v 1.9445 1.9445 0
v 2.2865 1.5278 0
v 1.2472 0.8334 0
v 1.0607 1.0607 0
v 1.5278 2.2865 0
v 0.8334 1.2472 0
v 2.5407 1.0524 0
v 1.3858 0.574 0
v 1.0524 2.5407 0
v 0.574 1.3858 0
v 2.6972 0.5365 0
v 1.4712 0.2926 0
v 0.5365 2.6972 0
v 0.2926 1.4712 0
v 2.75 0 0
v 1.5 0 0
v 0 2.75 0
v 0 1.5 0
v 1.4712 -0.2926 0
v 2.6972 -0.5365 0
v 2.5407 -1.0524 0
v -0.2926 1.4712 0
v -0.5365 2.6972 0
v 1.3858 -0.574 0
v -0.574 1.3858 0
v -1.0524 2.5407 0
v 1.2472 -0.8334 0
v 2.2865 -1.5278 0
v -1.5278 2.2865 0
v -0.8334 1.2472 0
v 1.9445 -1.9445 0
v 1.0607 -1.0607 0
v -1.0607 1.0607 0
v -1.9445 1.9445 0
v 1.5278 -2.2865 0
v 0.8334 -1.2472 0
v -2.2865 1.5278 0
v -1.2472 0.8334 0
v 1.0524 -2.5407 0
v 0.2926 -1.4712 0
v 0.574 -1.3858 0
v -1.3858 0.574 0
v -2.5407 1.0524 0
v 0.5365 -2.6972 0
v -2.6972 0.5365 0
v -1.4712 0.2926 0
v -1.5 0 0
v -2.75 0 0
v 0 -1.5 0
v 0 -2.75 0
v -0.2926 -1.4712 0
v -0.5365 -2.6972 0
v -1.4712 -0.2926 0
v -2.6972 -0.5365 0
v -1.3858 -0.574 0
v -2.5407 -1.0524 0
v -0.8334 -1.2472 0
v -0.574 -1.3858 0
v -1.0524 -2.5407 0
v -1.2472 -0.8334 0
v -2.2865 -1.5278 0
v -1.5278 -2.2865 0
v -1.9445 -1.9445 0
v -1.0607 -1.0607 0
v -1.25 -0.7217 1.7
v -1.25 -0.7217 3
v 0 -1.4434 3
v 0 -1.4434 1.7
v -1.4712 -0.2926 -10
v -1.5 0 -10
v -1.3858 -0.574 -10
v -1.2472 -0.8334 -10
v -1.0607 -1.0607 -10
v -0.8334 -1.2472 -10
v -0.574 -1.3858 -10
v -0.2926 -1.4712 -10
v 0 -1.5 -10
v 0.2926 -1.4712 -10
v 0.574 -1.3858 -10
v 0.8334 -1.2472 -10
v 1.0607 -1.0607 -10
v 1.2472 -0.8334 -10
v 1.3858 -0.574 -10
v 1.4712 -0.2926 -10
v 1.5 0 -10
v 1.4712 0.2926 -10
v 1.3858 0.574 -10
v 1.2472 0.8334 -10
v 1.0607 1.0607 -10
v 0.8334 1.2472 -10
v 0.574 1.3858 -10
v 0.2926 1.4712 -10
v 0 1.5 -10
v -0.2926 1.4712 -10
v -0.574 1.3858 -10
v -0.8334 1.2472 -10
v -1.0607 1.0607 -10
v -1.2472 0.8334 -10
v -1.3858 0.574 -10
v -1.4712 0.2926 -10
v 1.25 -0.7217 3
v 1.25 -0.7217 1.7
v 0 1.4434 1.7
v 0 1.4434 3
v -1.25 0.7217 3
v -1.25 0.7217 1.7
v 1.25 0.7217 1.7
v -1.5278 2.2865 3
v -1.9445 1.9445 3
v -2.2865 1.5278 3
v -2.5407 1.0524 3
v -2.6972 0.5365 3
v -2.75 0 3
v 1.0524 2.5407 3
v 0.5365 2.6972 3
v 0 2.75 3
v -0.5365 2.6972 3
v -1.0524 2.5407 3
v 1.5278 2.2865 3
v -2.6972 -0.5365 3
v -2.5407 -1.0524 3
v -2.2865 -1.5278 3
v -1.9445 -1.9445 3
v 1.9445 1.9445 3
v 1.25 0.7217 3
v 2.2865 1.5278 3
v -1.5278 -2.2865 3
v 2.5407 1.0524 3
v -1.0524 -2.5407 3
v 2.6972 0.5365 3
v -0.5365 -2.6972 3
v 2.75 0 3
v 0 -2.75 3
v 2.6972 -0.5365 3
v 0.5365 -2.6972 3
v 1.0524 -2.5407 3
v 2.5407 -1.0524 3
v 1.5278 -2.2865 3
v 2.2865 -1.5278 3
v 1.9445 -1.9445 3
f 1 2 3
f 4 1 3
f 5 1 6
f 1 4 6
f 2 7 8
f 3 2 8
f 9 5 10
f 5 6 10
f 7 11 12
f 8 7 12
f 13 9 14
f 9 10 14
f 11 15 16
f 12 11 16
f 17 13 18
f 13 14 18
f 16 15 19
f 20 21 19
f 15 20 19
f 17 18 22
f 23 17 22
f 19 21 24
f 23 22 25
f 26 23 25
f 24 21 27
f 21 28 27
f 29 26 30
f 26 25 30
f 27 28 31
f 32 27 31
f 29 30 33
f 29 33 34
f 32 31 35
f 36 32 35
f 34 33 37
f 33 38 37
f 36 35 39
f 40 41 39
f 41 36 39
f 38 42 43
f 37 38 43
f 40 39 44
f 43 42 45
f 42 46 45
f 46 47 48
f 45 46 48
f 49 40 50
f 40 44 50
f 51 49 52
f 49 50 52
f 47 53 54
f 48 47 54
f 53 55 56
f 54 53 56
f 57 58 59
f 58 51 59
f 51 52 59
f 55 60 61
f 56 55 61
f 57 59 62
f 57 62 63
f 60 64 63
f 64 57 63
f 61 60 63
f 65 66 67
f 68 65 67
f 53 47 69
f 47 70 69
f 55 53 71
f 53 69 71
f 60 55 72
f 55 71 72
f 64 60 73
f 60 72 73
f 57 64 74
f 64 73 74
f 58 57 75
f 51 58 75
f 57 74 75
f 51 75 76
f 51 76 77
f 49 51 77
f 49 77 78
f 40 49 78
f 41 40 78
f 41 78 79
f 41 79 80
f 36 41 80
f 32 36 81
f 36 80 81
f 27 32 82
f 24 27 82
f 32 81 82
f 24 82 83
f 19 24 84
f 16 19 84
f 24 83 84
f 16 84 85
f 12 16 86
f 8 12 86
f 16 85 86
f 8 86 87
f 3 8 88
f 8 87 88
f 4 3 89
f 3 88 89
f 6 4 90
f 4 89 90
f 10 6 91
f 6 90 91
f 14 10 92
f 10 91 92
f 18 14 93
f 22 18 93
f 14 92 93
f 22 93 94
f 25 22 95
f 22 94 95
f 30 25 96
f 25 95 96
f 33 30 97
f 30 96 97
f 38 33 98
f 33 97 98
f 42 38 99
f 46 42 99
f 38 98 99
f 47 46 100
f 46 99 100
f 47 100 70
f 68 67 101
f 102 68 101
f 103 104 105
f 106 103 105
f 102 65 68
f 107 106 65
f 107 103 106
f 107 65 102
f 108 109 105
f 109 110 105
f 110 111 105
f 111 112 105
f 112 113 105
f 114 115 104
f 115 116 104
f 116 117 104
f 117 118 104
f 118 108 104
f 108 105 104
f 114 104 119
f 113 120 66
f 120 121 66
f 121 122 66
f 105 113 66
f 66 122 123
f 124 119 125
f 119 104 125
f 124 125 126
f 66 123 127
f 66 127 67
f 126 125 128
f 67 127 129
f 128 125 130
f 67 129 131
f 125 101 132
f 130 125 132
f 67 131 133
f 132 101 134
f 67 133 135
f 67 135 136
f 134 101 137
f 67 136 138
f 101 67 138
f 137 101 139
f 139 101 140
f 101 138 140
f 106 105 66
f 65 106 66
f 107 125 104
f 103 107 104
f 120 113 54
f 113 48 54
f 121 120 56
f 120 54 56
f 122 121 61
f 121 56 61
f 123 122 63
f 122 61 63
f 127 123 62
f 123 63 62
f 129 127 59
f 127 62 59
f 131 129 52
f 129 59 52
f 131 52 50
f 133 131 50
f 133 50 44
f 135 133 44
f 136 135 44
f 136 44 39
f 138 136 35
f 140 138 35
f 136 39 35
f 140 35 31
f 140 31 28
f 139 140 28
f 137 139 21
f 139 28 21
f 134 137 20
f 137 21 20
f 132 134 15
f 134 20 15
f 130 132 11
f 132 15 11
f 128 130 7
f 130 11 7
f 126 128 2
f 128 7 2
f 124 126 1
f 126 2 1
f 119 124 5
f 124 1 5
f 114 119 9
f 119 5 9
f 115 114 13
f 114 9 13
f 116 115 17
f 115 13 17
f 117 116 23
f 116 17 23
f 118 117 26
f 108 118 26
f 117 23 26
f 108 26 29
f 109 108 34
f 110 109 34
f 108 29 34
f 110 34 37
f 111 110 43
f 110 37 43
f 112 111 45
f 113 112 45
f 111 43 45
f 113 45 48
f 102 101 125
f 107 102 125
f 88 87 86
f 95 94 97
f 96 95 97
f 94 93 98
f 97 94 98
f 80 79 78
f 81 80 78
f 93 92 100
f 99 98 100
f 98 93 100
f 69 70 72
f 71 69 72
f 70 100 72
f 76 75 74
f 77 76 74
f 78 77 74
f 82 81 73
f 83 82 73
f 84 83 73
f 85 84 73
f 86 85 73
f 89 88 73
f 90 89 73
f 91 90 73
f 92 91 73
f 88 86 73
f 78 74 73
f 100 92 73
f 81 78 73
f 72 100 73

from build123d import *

# Parameters (mm, degrees)
F3_DEPTH = 1.3


with BuildPart() as f1:
    # F0 (on Front) → F1 (revolve)
    with BuildSketch(Plane.XZ):
        Polygon((-2.75, 0), (-1.5, 0), (-1.5, -10), (0, -10), (0, 0), (0, 3), (-2.75, 3), align=None)
    revolve(axis=Axis((0, 0, -5), (0, 0, 1)))

    # F2 (on face) → F3 (cut)
    with BuildSketch(Plane.XY.offset(3)):
        Polygon((-1.25, 0.721688), (-1.25, -0.721688), (0, -1.443376), (1.25, -0.721688), (1.25, 0.721688), (0, 1.443376), align=None)
    extrude(amount=-F3_DEPTH, mode=Mode.SUBTRACT)


solid = f1.part
